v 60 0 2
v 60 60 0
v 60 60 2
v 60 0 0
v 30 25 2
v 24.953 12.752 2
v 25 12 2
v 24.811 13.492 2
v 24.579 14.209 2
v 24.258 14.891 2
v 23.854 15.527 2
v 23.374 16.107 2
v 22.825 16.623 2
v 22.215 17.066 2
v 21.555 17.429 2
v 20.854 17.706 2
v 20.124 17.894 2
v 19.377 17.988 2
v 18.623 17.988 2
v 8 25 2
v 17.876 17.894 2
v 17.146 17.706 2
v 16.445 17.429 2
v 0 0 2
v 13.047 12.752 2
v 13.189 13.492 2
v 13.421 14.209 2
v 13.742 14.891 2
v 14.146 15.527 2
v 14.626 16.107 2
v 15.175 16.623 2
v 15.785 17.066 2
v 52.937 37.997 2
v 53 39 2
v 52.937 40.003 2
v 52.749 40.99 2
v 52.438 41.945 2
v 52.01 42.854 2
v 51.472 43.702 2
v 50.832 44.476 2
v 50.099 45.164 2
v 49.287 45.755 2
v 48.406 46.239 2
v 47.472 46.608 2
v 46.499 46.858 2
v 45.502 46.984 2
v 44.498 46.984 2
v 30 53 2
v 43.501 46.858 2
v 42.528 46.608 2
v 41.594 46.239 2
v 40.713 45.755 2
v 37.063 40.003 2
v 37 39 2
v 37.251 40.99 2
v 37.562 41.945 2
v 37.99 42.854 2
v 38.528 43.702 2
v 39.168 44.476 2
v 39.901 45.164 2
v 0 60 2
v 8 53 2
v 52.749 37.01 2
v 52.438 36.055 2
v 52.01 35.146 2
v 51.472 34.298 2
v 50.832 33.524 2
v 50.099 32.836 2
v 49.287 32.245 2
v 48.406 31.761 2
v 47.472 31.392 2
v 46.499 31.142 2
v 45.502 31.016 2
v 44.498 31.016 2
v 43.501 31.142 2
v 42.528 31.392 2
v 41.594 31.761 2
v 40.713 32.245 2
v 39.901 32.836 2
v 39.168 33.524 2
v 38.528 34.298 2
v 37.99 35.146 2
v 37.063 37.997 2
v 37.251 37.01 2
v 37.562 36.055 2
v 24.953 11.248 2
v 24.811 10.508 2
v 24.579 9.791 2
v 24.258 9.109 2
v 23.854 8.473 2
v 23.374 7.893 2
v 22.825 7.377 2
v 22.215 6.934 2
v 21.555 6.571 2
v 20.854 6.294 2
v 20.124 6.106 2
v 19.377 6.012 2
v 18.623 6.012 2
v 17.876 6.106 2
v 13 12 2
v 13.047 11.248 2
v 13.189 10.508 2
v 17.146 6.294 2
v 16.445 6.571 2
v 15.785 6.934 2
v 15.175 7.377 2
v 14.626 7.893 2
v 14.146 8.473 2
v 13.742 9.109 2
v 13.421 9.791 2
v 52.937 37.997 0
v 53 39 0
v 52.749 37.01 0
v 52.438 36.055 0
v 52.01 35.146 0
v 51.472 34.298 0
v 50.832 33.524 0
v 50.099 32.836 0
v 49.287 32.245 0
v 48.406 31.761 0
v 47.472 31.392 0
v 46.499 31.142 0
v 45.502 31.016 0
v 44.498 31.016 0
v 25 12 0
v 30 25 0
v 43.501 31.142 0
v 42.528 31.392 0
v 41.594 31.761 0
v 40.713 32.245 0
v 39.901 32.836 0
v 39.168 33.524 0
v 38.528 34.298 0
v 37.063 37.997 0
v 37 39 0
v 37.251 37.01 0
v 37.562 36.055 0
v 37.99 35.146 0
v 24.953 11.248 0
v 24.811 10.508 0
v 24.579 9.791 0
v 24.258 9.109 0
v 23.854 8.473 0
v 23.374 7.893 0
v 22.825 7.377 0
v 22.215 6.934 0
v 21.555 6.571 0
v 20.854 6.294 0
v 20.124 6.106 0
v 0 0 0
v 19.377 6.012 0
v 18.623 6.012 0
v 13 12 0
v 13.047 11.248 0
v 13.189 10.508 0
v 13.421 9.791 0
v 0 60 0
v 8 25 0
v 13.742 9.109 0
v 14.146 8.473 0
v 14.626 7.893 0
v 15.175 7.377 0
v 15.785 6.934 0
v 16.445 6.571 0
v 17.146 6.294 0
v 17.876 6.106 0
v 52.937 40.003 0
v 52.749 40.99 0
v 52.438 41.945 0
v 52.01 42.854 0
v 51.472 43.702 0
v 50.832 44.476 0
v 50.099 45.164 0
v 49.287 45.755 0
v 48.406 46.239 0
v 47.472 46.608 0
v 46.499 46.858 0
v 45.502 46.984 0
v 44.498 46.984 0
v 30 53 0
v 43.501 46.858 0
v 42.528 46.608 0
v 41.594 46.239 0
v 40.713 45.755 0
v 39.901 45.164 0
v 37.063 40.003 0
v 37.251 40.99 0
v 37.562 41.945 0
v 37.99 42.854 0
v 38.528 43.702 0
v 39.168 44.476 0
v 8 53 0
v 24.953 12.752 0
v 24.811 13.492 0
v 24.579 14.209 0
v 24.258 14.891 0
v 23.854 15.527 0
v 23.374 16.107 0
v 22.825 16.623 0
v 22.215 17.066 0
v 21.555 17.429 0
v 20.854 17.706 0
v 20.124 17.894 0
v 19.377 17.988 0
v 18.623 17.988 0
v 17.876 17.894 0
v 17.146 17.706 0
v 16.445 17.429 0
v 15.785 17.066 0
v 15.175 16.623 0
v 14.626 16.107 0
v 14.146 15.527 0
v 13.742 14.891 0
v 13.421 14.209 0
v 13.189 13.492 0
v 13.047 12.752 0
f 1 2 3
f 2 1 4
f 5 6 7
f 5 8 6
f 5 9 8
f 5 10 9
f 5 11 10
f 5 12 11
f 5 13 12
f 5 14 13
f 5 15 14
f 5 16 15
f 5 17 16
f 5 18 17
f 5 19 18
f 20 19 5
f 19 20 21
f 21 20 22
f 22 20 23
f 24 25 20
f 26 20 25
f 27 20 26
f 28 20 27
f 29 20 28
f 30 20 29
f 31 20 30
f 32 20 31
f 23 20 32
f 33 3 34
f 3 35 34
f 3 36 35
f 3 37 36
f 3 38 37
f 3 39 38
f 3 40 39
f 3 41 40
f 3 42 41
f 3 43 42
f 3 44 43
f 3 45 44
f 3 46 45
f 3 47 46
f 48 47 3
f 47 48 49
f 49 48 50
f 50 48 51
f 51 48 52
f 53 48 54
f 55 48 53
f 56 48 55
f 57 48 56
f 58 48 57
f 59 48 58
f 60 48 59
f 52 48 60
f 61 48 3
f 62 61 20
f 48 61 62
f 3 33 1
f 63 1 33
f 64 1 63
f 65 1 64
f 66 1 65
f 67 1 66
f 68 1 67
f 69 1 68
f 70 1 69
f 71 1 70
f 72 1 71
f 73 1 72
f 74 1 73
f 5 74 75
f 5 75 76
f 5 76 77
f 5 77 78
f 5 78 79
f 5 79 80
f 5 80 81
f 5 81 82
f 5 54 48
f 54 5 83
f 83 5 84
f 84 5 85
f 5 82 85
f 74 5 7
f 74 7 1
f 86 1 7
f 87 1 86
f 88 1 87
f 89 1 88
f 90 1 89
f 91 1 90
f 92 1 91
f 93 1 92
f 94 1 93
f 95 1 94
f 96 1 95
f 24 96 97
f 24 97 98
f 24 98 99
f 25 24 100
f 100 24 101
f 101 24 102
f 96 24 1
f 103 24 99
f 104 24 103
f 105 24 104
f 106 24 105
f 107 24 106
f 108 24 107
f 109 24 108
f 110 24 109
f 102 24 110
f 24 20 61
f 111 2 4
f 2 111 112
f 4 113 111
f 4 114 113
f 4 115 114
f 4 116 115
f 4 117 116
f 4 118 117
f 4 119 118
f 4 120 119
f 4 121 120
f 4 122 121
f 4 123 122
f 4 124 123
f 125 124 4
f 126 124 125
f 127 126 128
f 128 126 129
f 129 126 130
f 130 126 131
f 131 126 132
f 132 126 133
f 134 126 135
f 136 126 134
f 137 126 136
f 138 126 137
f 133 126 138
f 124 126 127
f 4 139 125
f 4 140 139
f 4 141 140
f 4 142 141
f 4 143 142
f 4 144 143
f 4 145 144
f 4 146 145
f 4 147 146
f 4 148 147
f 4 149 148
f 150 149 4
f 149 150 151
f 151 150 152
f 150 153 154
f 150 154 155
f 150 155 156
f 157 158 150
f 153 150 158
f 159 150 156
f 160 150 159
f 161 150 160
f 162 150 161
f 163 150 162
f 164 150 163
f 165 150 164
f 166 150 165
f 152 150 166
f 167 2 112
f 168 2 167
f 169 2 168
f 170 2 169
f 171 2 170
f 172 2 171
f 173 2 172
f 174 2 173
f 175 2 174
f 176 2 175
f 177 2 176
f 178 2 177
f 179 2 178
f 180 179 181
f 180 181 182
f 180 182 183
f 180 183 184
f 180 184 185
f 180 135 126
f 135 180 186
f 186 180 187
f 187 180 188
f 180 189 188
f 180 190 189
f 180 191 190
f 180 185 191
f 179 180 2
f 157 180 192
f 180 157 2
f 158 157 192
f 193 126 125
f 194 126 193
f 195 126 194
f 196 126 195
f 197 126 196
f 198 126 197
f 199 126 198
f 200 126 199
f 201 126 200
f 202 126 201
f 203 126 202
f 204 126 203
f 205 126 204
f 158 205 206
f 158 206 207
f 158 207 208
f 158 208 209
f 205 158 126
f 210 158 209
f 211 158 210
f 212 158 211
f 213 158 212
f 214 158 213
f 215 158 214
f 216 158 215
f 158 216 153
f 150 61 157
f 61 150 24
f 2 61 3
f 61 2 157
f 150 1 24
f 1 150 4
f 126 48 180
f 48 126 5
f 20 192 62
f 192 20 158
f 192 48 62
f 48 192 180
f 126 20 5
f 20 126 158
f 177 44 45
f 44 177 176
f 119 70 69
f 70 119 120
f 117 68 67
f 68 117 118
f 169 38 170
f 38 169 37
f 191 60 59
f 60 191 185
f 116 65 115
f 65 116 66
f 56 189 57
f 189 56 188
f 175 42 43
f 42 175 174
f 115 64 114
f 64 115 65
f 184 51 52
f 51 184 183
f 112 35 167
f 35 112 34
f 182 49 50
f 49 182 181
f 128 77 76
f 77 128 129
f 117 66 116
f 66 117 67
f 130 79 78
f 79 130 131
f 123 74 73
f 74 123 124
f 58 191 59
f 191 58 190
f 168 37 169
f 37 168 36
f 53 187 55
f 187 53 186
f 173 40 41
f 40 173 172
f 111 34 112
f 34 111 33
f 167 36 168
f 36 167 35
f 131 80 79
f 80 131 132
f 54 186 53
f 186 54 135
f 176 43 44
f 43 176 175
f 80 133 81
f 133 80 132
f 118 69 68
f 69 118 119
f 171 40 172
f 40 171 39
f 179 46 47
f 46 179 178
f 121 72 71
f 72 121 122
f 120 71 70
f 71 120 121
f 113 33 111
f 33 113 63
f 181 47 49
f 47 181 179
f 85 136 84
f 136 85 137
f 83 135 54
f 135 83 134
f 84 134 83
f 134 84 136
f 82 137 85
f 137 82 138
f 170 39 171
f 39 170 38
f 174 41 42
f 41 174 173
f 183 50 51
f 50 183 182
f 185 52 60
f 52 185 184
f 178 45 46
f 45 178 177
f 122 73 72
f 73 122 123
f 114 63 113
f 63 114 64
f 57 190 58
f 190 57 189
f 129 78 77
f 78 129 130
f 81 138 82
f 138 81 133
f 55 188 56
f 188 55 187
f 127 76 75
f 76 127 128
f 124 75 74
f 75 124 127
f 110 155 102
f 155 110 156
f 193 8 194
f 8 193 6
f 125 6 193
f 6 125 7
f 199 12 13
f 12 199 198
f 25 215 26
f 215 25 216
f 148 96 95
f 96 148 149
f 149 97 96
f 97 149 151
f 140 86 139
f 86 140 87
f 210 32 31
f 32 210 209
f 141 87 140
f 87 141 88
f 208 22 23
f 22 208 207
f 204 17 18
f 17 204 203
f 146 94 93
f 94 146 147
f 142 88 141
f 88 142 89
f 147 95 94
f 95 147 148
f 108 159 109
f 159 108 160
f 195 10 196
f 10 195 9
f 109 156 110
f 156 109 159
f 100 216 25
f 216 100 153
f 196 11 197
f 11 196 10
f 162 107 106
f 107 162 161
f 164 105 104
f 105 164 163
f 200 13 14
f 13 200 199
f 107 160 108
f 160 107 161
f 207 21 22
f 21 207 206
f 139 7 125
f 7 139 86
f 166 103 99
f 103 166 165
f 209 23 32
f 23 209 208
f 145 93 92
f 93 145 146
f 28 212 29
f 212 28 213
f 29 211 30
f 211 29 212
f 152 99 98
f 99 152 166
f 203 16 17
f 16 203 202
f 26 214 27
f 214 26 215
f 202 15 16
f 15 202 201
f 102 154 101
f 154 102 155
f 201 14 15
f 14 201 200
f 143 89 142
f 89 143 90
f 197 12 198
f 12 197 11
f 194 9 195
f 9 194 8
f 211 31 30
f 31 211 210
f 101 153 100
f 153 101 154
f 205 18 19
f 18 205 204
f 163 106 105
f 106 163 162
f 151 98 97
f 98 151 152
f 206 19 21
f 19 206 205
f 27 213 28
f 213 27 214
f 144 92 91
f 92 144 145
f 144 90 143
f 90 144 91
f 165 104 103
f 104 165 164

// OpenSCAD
$fn = 50;

// back
difference() {
	cube([60, 60, 2]);
	// 12 pin connector
	translate([8, 25, -0.5]) cube([22, 28, 3]);
	// button
	translate([45, 39, -0.5]) cylinder(r = 8, h = 3);
	// power plug
	translate([19, 12, -0.5]) cylinder(r = 6, h = 3);
}
